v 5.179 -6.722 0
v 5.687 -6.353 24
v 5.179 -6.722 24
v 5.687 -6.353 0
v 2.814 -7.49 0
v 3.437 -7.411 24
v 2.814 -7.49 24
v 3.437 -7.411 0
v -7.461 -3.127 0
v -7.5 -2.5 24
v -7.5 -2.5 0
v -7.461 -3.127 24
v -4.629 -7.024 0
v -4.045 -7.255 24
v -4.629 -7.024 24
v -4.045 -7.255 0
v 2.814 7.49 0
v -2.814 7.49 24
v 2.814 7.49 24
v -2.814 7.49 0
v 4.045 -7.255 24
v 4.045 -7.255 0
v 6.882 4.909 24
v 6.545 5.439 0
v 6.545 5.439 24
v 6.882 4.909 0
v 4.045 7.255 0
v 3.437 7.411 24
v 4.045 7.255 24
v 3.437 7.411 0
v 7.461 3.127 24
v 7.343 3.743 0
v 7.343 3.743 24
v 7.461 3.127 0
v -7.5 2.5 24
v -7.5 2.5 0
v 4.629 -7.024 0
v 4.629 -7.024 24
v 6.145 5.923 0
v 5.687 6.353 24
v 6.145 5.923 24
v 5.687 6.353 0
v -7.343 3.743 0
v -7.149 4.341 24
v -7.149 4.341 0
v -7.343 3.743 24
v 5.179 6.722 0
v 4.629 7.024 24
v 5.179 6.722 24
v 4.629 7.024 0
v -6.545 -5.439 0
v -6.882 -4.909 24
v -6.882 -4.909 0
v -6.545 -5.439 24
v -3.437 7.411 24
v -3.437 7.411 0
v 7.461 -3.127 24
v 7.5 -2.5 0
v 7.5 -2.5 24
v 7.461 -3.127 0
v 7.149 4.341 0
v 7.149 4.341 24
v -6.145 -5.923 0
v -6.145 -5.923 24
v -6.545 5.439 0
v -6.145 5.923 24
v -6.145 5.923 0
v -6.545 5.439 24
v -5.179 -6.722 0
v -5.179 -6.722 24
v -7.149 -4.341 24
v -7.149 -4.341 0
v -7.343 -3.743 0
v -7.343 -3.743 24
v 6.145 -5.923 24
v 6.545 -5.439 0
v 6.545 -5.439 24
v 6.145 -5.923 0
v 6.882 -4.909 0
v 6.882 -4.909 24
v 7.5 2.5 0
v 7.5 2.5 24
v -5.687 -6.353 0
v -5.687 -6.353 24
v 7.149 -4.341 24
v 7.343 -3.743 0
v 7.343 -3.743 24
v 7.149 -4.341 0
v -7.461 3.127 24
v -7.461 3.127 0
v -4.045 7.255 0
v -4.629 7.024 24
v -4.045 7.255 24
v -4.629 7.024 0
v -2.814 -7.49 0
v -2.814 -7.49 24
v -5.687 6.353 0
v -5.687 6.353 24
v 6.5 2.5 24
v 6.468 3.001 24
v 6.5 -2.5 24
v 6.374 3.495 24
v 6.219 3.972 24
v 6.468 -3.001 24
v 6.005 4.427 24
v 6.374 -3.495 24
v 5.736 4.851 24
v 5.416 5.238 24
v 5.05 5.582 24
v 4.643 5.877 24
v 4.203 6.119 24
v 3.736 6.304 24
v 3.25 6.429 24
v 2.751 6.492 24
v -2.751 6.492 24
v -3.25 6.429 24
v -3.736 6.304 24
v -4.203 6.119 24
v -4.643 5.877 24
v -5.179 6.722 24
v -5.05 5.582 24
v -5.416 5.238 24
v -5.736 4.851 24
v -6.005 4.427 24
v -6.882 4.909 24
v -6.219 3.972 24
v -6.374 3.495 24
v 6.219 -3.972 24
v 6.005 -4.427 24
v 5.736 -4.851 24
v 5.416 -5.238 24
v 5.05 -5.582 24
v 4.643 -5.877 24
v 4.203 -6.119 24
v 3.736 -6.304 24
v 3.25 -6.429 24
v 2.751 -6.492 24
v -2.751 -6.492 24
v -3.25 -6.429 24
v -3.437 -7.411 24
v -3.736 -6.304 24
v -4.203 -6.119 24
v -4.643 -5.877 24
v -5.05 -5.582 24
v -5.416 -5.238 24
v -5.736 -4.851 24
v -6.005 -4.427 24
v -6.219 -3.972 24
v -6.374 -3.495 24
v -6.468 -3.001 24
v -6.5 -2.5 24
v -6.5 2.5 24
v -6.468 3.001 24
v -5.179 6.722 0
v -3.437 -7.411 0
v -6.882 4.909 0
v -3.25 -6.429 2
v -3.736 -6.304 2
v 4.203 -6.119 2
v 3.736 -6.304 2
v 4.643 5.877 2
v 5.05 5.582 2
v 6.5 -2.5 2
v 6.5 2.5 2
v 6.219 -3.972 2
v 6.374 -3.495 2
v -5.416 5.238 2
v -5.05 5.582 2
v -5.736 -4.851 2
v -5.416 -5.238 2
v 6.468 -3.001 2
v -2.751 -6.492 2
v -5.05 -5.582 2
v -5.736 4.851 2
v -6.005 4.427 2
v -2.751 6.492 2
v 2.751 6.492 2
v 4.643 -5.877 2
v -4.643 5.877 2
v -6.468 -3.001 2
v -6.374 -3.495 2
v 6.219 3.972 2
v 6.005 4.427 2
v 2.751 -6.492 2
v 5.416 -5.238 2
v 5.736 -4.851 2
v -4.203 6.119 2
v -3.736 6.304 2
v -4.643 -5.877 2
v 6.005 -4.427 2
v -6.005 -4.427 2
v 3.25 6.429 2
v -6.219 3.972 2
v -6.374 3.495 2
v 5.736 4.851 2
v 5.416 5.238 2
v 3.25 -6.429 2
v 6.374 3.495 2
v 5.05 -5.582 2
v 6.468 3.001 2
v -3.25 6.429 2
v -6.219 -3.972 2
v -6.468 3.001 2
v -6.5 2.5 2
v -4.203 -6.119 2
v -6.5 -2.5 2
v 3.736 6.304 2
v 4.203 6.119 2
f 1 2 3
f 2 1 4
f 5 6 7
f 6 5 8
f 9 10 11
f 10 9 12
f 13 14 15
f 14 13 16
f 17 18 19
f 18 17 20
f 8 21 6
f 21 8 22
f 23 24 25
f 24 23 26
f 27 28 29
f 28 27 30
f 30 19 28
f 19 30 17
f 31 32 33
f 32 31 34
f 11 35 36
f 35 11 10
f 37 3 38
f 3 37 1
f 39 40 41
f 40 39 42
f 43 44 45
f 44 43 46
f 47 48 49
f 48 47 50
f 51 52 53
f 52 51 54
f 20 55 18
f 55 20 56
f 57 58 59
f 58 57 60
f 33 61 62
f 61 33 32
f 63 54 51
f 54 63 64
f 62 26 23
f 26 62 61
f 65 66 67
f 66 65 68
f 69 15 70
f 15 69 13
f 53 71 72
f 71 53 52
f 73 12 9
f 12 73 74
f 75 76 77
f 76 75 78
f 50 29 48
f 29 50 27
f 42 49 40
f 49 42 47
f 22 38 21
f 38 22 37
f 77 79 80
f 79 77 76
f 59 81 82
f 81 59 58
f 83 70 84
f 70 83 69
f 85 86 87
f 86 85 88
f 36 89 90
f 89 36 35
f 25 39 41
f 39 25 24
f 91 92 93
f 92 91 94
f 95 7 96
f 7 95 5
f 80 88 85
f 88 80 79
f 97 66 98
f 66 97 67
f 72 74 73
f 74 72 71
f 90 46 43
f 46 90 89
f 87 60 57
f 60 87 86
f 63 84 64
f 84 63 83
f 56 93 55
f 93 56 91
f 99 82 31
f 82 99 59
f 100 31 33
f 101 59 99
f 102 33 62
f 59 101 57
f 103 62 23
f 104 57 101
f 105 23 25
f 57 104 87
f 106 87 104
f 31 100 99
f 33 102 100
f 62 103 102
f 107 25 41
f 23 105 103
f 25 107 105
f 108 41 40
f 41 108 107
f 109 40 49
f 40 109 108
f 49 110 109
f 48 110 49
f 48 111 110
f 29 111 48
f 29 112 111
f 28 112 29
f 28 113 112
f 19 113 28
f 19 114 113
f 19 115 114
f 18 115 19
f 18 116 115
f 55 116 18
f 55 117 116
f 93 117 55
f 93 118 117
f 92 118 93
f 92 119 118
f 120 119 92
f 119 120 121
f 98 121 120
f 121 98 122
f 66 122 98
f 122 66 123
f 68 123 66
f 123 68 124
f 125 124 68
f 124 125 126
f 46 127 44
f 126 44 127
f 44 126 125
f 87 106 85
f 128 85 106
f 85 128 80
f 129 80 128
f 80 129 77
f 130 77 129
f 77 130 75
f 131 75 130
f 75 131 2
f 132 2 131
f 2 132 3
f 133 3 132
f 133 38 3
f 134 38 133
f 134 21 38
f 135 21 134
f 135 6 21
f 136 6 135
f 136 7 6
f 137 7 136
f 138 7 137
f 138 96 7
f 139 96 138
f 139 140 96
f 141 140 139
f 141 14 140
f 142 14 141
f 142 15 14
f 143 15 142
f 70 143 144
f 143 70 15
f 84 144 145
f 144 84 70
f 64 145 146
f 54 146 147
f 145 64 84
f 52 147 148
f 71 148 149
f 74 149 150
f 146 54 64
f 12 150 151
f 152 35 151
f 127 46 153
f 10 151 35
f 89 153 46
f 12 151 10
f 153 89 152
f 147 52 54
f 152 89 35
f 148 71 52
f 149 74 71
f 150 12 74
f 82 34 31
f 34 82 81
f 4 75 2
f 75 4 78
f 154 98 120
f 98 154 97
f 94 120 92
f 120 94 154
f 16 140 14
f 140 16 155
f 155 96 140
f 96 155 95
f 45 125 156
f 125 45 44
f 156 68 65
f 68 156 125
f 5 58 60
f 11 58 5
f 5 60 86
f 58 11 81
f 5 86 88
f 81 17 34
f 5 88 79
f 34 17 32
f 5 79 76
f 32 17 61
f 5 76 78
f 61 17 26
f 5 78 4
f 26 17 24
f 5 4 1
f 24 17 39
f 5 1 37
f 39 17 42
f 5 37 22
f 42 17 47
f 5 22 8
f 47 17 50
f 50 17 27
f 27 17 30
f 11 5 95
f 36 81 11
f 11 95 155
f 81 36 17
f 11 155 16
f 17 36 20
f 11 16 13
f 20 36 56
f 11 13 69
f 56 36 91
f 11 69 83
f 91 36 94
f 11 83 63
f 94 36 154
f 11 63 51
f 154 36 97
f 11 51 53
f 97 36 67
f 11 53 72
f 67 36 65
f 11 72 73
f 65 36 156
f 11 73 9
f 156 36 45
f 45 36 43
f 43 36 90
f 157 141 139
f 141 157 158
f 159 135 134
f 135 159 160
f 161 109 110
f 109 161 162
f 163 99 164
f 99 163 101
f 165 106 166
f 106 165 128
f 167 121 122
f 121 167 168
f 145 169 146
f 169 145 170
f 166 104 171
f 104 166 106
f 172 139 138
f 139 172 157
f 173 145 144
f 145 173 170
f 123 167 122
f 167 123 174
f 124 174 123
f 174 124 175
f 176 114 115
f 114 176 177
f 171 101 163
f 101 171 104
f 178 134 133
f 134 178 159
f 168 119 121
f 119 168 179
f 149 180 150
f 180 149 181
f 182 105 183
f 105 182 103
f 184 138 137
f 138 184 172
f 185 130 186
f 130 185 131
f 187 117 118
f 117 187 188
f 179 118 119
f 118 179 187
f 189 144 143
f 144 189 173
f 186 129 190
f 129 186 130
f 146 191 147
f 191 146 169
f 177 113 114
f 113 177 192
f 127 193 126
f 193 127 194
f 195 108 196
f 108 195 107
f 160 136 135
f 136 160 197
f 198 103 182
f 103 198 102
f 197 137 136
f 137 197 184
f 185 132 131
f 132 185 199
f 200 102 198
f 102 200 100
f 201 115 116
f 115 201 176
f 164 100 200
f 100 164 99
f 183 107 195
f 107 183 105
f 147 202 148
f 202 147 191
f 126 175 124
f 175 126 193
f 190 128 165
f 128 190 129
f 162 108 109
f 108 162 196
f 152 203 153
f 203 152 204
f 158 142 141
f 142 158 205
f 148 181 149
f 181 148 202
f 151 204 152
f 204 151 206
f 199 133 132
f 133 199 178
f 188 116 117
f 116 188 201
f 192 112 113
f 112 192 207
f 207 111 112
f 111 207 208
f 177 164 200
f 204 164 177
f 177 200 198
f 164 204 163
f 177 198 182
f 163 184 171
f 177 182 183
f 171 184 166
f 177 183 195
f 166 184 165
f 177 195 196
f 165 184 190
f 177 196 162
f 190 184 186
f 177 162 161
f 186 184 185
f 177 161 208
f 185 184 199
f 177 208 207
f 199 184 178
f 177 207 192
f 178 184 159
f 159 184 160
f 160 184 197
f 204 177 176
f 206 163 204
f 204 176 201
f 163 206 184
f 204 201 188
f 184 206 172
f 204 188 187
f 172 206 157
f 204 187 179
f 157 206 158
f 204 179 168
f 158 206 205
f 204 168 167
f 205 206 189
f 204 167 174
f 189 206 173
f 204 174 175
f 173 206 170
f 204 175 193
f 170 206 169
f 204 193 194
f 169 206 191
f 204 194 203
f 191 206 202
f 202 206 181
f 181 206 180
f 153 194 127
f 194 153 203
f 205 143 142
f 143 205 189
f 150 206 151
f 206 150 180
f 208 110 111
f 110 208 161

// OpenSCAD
$fn = 50;


difference() {
	union() {
		hull() {
			translate(v = [-2.5000000000, 2.5000000000, 0]) {
				cylinder(h = 24, r = 5);
			}
			translate(v = [2.5000000000, 2.5000000000, 0]) {
				cylinder(h = 24, r = 5);
			}
			translate(v = [-2.5000000000, -2.5000000000, 0]) {
				cylinder(h = 24, r = 5);
			}
			translate(v = [2.5000000000, -2.5000000000, 0]) {
				cylinder(h = 24, r = 5);
			}
		}
	}
	union() {
		translate(v = [0, 0, 2]) {
			hull() {
				translate(v = [-2.5000000000, 2.5000000000, 0]) {
					cylinder(h = 22, r = 4);
				}
				translate(v = [2.5000000000, 2.5000000000, 0]) {
					cylinder(h = 22, r = 4);
				}
				translate(v = [-2.5000000000, -2.5000000000, 0]) {
					cylinder(h = 22, r = 4);
				}
				translate(v = [2.5000000000, -2.5000000000, 0]) {
					cylinder(h = 22, r = 4);
				}
			}
		}
	}
}
